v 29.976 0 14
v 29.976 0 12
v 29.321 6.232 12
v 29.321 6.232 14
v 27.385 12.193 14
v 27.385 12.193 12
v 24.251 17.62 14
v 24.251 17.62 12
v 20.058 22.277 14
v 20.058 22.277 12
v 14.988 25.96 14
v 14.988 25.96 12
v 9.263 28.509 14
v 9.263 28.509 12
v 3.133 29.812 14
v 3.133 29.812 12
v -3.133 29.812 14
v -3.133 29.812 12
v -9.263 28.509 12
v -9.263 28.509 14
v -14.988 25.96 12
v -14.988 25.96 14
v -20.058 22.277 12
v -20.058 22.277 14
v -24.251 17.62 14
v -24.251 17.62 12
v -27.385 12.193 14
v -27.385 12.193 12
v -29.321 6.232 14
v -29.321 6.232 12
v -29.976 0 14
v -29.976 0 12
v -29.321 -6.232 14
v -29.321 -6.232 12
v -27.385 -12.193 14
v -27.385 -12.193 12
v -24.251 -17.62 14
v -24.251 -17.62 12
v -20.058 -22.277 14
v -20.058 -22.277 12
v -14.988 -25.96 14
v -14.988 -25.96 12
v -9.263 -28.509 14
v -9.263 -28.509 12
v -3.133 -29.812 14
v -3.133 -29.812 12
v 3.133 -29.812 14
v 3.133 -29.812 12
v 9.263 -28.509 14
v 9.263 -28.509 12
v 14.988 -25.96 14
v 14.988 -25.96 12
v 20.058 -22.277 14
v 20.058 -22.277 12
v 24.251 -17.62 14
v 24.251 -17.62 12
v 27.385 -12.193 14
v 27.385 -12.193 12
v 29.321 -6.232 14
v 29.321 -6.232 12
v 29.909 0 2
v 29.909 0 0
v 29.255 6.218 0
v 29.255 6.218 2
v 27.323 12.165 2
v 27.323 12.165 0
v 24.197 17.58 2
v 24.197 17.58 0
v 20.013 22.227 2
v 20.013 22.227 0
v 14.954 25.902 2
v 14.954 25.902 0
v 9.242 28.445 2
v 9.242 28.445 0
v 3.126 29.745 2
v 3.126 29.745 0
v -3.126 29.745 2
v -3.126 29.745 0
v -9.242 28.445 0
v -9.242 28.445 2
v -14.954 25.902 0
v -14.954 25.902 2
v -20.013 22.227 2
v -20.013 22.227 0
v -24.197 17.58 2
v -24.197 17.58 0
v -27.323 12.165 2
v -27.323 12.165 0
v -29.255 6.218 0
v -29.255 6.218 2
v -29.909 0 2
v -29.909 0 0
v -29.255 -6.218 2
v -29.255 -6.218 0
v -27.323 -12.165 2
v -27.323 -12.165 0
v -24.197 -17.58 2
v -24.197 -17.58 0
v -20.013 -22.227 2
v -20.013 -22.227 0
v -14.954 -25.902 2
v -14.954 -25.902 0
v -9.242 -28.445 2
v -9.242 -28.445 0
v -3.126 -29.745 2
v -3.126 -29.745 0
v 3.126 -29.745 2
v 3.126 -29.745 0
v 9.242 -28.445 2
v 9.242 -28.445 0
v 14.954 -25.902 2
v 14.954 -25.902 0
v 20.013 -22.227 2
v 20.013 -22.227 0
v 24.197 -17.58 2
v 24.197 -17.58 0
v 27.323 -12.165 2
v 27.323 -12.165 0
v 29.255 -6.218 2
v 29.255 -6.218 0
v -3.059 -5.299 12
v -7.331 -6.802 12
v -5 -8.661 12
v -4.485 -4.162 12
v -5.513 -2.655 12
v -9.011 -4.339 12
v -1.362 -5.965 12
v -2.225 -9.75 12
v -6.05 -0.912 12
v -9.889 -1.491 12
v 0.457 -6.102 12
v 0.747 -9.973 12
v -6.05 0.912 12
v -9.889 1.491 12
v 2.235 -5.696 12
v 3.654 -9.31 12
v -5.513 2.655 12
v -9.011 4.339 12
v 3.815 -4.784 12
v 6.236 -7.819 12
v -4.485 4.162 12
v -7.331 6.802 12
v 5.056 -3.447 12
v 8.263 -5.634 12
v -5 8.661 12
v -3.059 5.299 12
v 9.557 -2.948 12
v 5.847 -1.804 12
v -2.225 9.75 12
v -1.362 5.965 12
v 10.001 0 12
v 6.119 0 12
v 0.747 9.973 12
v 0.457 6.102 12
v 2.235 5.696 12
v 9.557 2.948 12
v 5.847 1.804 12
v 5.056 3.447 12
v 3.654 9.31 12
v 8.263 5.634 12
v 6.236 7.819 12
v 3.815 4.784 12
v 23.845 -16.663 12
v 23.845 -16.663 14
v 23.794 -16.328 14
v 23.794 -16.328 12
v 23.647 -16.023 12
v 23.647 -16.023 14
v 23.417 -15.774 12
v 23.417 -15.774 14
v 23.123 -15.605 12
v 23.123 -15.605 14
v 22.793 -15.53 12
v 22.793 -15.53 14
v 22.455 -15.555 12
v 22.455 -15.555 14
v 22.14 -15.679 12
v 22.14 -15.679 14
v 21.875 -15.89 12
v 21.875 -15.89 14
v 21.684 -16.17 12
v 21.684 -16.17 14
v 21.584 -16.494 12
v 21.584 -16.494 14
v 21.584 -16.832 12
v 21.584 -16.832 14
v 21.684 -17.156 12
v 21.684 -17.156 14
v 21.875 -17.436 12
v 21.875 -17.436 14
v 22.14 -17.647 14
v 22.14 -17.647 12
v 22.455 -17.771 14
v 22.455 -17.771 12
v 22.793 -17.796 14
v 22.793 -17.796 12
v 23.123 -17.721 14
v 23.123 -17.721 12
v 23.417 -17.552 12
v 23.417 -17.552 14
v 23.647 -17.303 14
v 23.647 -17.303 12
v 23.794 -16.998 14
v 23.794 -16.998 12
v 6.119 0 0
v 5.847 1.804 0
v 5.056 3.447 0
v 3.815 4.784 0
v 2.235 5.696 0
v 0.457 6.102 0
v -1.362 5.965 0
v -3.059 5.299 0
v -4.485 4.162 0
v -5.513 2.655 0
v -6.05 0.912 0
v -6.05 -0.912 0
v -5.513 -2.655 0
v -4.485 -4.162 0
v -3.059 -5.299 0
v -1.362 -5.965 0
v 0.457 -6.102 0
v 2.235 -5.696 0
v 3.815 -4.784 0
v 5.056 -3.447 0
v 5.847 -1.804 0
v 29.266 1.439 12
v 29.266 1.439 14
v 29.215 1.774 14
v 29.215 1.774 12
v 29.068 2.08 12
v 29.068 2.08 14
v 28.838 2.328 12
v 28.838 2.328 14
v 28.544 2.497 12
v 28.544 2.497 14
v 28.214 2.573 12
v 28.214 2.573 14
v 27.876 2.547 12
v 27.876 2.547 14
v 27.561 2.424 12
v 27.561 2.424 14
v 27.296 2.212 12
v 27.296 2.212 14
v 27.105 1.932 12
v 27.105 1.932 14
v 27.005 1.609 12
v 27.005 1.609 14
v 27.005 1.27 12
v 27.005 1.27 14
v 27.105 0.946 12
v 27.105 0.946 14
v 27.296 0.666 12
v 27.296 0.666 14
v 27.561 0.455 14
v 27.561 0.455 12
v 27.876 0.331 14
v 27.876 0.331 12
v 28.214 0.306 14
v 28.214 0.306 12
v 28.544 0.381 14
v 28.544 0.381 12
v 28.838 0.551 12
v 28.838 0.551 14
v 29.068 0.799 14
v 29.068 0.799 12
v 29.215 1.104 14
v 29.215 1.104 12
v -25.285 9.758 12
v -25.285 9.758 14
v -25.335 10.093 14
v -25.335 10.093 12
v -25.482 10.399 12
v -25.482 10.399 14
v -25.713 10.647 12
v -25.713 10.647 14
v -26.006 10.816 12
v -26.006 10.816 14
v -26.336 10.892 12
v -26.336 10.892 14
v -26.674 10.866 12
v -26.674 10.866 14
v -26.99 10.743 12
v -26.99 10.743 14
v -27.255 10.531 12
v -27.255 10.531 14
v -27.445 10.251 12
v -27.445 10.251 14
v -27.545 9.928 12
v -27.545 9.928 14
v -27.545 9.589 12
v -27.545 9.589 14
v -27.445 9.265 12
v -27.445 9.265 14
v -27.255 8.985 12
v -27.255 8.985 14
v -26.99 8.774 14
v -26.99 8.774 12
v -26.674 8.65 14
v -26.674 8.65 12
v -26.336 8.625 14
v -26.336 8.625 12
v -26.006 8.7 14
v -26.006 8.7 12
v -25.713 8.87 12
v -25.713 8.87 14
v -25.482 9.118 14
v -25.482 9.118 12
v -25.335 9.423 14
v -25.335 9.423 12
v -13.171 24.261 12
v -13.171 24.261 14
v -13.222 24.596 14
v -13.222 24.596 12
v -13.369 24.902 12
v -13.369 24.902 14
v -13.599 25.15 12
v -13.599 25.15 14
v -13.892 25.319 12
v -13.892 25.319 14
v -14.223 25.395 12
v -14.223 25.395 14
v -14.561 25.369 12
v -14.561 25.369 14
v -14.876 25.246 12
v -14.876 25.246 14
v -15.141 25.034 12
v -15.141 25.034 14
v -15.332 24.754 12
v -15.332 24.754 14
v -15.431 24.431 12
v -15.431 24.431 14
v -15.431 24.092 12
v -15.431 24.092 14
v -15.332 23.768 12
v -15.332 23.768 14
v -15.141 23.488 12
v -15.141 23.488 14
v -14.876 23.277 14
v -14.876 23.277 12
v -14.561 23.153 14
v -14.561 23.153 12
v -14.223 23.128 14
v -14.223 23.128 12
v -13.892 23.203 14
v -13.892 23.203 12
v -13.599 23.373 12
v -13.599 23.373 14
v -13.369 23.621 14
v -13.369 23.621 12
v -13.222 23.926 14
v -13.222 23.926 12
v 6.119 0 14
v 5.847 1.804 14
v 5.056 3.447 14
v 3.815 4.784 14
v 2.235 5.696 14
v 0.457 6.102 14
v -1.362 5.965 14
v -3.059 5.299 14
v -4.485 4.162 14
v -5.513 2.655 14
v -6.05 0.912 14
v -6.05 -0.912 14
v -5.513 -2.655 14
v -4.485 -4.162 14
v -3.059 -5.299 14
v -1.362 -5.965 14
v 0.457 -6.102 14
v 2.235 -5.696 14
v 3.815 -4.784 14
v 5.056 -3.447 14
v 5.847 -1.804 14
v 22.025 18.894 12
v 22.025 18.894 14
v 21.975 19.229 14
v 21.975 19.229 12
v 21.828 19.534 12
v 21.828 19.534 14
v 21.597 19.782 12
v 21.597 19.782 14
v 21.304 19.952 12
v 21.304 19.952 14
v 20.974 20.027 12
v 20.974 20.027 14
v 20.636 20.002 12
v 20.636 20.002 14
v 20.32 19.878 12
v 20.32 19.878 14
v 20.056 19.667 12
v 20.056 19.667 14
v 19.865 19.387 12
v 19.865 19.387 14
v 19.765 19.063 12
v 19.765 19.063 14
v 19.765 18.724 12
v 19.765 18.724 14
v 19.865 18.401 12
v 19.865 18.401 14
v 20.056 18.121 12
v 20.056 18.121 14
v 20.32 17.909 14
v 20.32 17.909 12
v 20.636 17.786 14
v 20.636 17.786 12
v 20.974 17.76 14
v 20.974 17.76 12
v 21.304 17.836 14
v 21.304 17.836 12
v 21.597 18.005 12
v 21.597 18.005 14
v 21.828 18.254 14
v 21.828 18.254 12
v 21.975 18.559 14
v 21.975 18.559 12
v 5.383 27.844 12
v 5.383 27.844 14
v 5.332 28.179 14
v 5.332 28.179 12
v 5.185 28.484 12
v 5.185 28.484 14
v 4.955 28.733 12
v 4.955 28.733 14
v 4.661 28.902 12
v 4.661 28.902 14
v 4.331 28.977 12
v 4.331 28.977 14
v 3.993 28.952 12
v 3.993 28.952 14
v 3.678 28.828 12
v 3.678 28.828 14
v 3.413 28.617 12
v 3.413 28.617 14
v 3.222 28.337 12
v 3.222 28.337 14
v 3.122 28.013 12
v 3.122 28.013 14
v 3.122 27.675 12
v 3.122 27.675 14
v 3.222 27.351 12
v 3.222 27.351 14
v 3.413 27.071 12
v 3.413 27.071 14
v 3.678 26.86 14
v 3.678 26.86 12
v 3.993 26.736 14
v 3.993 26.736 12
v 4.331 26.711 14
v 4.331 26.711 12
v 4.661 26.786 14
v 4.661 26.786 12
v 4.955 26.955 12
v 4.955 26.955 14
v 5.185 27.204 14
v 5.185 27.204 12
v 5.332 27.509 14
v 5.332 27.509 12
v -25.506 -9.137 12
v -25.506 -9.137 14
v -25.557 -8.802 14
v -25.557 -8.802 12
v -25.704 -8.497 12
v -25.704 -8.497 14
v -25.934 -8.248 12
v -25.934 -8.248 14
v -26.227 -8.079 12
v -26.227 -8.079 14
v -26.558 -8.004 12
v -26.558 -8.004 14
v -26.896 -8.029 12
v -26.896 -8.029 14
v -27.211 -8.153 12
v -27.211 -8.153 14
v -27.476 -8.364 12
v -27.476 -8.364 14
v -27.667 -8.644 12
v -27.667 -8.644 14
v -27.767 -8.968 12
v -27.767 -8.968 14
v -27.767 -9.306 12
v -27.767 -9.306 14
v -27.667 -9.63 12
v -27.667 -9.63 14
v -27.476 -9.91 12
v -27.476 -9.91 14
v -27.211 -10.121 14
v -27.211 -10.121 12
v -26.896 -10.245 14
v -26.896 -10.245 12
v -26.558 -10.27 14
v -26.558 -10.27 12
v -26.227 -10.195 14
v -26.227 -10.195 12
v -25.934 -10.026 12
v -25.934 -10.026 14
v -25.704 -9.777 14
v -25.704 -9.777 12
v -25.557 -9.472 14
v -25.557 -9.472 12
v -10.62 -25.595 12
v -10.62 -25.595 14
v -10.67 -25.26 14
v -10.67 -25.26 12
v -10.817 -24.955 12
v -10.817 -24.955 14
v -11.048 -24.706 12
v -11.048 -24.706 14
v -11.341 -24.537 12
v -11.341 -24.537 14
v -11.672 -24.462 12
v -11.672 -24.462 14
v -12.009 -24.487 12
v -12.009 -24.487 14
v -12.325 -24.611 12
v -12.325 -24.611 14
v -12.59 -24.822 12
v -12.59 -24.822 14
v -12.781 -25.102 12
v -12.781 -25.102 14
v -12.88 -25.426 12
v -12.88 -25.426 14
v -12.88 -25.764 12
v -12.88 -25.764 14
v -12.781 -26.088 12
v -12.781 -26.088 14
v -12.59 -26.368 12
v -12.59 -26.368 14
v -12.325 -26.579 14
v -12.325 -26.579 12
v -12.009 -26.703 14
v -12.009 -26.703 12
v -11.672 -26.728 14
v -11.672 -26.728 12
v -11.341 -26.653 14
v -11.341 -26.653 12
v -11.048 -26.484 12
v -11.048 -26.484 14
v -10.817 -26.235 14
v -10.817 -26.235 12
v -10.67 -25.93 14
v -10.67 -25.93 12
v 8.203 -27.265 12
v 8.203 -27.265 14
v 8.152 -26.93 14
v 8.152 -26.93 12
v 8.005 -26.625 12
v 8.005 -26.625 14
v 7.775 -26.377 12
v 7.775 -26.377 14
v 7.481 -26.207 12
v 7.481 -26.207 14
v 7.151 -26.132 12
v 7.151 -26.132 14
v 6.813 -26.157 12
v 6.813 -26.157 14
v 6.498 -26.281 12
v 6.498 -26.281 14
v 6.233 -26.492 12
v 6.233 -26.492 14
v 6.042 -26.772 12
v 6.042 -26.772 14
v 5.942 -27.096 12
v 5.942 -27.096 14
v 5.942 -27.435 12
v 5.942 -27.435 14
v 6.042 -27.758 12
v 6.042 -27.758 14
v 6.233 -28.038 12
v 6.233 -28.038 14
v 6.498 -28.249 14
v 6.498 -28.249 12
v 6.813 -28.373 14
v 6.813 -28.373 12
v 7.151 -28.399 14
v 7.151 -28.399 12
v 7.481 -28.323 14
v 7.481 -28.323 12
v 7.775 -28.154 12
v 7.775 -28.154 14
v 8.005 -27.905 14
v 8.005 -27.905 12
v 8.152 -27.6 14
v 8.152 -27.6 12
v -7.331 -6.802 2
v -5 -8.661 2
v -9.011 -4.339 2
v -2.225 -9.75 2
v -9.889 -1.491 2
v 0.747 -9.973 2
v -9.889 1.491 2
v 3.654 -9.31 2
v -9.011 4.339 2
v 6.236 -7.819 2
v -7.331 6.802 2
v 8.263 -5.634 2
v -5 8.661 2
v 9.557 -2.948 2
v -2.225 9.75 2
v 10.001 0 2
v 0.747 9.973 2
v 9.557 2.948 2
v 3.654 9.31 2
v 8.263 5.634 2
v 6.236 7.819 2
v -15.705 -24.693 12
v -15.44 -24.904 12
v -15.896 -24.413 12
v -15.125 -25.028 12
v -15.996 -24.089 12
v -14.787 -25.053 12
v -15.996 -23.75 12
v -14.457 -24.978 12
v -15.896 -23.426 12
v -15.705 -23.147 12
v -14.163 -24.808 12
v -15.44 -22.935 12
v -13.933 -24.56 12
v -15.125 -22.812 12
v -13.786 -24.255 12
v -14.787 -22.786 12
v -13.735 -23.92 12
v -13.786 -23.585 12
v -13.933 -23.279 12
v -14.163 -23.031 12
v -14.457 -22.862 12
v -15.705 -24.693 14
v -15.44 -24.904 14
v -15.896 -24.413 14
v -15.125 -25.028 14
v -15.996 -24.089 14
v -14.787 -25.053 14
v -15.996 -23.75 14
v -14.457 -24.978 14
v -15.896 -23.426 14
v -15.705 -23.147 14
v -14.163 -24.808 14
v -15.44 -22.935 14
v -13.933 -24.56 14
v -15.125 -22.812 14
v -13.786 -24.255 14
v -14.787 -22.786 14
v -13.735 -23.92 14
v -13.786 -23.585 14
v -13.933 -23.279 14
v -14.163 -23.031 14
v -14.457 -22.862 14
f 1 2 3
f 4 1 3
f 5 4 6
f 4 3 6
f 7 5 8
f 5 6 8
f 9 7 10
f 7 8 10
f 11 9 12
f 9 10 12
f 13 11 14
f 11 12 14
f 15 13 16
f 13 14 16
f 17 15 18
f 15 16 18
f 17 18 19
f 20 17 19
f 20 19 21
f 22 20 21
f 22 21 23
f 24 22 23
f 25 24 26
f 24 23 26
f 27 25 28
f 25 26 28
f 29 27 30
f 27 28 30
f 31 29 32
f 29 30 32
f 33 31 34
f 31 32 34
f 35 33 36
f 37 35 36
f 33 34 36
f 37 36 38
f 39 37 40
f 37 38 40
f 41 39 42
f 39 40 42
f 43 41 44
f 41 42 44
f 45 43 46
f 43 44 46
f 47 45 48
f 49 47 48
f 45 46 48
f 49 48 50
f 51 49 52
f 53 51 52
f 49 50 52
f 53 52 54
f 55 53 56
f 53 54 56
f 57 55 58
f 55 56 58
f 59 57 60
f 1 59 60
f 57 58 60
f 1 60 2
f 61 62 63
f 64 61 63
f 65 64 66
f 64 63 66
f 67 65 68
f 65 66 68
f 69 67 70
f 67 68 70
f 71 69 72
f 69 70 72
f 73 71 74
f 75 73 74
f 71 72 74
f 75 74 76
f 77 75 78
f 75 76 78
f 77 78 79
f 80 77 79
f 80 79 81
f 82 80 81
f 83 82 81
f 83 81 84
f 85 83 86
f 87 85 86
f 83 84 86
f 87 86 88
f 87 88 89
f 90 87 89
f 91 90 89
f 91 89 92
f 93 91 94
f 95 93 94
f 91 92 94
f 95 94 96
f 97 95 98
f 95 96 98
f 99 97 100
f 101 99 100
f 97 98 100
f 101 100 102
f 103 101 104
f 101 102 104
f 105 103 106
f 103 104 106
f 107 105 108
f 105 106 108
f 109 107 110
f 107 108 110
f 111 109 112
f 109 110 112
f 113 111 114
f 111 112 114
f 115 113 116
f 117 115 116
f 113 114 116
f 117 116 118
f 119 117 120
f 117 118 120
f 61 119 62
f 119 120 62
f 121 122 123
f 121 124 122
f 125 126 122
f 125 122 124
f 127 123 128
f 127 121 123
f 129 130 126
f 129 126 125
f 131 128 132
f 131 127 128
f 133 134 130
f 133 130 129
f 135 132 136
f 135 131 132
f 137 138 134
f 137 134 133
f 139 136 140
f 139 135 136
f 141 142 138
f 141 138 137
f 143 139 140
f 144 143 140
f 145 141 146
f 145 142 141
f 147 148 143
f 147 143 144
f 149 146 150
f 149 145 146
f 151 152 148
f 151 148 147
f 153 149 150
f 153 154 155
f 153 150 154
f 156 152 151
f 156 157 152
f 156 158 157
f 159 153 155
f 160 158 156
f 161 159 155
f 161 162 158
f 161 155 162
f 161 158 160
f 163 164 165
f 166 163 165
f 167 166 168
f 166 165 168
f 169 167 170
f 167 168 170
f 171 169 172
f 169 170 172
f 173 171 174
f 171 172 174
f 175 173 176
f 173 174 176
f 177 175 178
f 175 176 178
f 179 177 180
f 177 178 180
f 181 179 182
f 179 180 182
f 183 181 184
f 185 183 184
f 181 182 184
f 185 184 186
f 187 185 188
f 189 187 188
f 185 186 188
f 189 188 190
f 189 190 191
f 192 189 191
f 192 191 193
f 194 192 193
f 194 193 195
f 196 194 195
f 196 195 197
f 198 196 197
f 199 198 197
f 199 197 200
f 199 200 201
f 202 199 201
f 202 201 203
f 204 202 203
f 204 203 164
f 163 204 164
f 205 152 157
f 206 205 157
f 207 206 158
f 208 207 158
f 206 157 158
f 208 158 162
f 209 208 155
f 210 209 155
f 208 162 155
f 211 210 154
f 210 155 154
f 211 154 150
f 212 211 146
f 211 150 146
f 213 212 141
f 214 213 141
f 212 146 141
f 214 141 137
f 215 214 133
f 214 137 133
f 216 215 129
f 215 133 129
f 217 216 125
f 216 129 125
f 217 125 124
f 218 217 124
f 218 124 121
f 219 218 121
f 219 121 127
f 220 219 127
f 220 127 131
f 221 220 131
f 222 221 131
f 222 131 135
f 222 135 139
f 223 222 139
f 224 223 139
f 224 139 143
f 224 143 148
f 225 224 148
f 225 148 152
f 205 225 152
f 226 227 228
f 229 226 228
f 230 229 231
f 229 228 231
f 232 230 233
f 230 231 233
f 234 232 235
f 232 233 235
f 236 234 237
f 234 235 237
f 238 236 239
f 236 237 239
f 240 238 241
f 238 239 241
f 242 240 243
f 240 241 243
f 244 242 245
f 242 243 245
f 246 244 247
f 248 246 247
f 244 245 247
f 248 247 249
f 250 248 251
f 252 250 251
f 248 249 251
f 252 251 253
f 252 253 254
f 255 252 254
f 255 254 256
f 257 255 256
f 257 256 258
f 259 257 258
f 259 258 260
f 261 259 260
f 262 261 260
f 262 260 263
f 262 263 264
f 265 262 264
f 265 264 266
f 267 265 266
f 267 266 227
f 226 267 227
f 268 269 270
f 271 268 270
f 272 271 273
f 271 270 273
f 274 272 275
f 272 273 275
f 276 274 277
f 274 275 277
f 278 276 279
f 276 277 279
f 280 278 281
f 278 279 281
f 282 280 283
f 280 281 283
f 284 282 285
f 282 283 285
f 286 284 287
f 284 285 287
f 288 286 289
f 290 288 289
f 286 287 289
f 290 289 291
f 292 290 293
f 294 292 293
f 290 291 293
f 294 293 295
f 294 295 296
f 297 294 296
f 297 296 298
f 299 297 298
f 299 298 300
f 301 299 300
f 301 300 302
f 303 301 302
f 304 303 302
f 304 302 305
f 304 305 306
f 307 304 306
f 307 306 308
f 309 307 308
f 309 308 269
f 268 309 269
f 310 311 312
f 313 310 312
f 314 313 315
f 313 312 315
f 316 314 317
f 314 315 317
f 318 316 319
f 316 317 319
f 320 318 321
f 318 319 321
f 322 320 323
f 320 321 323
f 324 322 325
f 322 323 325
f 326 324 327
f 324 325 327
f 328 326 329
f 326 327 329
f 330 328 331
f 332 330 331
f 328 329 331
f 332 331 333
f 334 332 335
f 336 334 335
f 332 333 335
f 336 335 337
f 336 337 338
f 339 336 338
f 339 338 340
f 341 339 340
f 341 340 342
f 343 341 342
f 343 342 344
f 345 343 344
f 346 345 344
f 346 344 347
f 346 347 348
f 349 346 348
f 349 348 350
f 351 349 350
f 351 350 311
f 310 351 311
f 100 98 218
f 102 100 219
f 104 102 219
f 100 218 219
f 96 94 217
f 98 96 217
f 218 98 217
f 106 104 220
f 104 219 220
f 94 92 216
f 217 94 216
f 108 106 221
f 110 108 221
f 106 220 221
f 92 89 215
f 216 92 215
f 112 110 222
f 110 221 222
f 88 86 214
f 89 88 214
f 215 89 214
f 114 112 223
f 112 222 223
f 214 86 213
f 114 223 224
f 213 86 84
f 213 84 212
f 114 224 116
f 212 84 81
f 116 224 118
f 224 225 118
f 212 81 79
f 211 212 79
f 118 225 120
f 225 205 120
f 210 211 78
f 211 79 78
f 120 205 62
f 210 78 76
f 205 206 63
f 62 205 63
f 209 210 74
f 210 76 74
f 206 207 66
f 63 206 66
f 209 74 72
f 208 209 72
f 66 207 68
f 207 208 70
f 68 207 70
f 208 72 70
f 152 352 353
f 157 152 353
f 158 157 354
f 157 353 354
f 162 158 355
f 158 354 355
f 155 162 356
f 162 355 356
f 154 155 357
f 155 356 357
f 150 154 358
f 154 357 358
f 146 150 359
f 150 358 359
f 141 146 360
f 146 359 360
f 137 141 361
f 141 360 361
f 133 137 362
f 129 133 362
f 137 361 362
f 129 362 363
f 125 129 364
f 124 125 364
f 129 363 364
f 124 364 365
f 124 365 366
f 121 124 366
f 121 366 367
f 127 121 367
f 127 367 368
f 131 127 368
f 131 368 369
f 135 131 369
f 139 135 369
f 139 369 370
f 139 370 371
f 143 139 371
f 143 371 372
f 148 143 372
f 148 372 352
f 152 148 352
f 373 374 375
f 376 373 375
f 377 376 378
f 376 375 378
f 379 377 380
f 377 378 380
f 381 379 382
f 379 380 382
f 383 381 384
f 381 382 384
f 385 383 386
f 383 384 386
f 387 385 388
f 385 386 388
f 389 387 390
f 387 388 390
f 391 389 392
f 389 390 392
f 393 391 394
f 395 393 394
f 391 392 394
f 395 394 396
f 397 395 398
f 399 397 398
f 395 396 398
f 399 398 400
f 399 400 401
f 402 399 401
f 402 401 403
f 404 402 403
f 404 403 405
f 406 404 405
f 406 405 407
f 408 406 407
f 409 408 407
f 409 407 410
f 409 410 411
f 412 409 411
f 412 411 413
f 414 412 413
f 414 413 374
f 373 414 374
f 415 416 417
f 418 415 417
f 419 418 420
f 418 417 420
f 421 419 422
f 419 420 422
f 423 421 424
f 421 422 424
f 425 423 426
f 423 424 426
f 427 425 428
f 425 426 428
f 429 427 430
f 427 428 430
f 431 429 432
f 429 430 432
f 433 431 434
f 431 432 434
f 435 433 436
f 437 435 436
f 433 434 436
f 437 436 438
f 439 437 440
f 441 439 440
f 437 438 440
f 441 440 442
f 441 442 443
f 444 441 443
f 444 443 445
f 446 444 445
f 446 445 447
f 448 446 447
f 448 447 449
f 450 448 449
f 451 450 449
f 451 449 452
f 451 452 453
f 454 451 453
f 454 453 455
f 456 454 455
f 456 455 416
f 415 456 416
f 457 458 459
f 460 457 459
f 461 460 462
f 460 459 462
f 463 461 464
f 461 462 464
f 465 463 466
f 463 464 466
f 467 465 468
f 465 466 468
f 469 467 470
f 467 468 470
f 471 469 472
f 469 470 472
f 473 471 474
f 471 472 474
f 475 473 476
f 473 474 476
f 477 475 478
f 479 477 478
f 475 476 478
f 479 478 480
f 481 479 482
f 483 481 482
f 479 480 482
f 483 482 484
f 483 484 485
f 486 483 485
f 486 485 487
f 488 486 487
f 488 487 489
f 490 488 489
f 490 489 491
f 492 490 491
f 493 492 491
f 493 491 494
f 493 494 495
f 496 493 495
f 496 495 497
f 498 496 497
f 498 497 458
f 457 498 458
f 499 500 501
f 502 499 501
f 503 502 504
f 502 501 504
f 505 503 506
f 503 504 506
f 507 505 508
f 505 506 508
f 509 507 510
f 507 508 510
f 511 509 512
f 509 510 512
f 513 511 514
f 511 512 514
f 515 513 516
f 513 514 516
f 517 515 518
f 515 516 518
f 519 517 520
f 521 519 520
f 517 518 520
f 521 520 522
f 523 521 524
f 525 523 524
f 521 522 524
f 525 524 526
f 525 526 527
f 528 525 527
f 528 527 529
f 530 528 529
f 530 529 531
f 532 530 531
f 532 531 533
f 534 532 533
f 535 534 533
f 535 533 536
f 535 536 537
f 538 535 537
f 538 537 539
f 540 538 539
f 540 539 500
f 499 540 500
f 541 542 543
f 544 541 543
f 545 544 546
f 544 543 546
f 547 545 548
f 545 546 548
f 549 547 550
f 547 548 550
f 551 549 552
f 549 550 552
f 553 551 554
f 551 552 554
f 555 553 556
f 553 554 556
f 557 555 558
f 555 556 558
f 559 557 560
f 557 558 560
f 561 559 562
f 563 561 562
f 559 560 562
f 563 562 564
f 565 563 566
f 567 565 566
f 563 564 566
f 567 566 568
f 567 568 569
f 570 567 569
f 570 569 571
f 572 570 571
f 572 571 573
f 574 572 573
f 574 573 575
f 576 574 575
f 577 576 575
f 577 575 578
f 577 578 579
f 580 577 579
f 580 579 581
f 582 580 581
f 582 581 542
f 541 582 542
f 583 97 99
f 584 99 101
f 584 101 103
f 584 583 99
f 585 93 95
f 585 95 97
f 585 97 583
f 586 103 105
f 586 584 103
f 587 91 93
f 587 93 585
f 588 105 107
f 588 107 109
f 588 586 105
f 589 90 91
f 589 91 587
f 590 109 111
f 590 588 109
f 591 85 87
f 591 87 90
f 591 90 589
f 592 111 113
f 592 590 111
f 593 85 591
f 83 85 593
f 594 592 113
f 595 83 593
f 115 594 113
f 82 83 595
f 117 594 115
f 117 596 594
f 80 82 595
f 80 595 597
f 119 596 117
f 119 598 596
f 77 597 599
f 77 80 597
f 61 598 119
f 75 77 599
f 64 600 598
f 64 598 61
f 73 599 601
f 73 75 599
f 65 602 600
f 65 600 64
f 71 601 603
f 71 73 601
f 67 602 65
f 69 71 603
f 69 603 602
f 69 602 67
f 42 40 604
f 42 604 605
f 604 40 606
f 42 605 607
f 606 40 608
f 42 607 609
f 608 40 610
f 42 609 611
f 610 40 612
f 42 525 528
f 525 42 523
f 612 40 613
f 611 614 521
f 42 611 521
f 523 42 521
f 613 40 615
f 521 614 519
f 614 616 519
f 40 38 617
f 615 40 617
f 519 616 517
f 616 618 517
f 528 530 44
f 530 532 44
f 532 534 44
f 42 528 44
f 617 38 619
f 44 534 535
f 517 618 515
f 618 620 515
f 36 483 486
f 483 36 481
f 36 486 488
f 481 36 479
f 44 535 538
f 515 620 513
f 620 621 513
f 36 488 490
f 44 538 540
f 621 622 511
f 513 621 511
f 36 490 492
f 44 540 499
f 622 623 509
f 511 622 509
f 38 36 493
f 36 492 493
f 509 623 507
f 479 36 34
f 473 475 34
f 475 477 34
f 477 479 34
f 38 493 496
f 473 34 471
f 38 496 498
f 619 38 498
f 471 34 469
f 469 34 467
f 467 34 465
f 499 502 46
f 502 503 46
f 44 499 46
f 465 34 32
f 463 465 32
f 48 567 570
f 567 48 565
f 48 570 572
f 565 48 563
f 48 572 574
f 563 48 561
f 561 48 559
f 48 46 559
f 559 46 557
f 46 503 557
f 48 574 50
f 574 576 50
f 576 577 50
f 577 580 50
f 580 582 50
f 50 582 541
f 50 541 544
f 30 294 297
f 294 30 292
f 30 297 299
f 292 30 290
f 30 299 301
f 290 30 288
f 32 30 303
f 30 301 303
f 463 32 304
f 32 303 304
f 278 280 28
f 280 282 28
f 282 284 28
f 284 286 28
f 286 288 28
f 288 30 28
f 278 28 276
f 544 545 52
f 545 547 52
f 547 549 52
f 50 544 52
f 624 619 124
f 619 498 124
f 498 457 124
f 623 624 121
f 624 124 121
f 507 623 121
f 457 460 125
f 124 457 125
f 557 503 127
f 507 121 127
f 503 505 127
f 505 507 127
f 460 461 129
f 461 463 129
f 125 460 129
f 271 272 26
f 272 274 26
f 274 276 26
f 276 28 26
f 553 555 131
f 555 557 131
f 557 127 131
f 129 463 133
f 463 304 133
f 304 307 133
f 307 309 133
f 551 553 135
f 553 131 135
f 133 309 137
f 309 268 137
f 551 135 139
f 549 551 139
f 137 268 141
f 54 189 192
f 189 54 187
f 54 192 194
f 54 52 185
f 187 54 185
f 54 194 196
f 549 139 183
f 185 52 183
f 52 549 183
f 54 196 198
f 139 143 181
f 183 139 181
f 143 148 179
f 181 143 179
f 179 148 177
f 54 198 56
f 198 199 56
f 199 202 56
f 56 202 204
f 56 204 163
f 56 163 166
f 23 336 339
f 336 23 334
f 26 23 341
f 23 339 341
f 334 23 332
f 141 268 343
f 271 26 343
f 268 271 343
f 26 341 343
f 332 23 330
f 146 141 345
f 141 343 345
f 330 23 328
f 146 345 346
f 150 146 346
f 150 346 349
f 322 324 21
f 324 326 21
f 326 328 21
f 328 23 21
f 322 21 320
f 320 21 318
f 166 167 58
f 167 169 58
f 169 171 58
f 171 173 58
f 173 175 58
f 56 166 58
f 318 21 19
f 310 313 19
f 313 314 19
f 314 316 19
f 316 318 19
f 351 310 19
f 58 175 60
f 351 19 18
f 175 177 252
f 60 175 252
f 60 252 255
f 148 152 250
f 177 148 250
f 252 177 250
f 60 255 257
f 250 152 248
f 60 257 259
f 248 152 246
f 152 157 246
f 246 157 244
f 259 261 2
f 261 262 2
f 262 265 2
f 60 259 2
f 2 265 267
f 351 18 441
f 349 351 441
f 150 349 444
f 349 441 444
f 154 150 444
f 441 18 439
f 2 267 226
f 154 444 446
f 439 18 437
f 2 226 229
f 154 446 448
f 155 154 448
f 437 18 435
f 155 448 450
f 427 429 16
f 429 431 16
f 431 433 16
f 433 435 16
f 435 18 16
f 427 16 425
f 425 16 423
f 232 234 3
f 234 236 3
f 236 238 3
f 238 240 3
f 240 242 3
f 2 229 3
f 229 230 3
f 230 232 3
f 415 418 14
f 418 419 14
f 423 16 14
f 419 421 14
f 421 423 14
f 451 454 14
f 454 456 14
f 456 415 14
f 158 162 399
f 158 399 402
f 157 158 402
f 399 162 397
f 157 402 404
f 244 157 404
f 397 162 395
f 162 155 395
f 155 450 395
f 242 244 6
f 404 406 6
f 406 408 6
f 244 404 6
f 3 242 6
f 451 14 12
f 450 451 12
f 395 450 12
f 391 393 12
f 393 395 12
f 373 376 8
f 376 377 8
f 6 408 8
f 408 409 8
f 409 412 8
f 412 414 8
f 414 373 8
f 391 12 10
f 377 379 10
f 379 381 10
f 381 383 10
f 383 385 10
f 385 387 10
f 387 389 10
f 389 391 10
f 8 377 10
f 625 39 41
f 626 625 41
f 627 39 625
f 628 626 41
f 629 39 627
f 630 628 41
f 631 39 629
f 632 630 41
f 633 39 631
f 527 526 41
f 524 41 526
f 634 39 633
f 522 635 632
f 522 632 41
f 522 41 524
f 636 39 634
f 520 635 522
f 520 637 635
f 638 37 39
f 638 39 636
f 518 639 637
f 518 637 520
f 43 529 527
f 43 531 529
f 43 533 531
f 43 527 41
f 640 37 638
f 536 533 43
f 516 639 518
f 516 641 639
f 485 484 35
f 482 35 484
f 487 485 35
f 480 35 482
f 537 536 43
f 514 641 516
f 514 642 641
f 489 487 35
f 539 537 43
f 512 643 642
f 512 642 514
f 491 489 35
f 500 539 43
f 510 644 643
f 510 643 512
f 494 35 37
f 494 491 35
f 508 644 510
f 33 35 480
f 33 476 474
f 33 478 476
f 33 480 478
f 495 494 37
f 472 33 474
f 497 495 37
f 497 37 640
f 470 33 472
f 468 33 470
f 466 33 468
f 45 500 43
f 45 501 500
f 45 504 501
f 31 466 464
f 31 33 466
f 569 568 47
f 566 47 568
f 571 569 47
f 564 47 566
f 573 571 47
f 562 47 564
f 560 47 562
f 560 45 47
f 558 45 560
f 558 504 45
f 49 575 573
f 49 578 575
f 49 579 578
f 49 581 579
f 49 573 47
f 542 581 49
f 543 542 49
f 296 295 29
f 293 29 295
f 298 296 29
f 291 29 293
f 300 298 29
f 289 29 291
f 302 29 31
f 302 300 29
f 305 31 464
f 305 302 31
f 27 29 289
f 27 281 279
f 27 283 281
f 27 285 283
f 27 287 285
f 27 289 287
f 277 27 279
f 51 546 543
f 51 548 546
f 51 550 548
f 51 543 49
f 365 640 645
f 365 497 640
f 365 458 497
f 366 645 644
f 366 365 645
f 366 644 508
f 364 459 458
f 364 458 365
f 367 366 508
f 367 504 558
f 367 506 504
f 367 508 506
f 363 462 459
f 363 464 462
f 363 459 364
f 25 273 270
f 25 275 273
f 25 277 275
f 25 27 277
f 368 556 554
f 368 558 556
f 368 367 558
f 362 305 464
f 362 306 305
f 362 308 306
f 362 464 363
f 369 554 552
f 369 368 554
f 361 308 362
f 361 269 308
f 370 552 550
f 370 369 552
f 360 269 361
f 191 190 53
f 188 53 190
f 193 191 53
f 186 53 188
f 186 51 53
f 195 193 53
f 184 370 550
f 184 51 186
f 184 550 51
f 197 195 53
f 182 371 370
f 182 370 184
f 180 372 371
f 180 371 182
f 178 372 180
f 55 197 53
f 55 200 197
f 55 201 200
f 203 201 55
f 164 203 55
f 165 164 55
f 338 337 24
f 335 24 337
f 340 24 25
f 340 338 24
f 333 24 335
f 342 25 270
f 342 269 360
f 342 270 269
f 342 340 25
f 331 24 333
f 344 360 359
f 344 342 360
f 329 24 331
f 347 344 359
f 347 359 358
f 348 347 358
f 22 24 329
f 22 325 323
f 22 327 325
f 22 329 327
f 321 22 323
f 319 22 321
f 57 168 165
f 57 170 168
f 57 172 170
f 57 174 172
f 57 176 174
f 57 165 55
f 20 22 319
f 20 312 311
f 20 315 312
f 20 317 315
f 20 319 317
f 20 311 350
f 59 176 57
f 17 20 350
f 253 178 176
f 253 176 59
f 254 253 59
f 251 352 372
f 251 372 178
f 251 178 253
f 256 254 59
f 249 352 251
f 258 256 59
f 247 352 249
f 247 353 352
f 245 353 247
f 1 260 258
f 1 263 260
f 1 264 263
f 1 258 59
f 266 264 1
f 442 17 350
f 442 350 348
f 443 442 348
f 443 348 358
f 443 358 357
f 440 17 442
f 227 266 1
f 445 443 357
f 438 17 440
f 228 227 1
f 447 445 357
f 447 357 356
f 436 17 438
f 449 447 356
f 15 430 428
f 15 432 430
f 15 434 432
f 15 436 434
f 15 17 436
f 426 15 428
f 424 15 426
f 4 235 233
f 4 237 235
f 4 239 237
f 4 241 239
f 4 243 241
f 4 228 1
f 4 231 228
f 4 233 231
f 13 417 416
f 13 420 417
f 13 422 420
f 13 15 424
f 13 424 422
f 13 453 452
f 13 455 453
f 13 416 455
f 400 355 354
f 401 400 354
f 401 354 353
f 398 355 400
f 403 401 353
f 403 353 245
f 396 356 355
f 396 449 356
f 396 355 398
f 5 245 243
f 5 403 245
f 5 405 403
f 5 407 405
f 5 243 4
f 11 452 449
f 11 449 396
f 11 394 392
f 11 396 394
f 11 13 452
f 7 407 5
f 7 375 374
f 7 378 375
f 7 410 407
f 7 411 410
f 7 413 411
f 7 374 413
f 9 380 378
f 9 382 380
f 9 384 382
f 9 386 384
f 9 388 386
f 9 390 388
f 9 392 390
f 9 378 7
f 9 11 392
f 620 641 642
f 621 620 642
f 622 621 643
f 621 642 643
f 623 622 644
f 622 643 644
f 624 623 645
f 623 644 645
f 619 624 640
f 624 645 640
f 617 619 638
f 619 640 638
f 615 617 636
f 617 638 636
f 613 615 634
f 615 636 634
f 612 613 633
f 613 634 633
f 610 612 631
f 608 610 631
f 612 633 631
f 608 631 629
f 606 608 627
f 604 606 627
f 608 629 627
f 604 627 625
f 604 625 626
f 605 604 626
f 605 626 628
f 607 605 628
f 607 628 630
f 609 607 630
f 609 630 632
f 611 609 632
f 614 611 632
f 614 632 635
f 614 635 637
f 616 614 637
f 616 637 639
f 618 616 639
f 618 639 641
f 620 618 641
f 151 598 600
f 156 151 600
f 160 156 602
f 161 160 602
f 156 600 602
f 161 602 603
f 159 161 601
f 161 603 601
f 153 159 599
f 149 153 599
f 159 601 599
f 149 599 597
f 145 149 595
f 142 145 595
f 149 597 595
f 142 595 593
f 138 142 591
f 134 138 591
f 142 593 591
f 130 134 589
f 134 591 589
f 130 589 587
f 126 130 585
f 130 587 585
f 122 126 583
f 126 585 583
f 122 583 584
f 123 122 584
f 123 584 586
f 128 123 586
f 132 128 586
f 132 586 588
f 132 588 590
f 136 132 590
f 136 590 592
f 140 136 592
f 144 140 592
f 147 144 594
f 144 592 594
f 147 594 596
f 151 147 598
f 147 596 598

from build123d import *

# Parameters (mm, degrees)
F0_R     = 29.9089661925
F1_DEPTH = 2
F2_R     = 10.0009924636
F3_DEPTH = 10
F4_R     = 29.9764800093
F5_DEPTH = 2
F6_R     = 1.1365848363
F7_DEPTH = 25
F8_R     = 6.1187155748
F9_DEPTH = 25


with BuildPart() as f1:
    # F0 (on Top) → F1 (new body)
    with BuildSketch(Plane.XY):
        Circle(F0_R)
    extrude(amount=F1_DEPTH)

    # F2 (on face) → F3 (join)
    with BuildSketch(Plane.XY.offset(2)):
        Circle(F2_R)
    extrude(amount=F3_DEPTH)


with BuildPart() as f5:
    # F4 (on face) → F5 (new body)
    with BuildSketch(Plane.XY.offset(12)):
        Circle(F4_R)
    extrude(amount=F5_DEPTH)

    # F6 (on face) → F7 (cut)
    with BuildSketch(Plane.XY.offset(14)):
        with Locations((-14.8717621341, -23.9195972681)):
            Circle(F6_R)
        with Locations((-26.6426764835, -9.136970627)):
            Circle(F6_R)
        with Locations((-26.4214284802, 9.7583072051)):
            Circle(F6_R)
        with Locations((-14.3076042892, 24.2612634038)):
            Circle(F6_R)
        with Locations((4.2462302972, 27.8439575259)):
            Circle(F6_R)
        with Locations((20.888789823, 18.8937794571)):
            Circle(F6_R)
        with Locations((28.1290748038, 1.439302999)):
            Circle(F6_R)
        with Locations((22.7081531643, -16.6630196036)):
            Circle(F6_R)
        with Locations((7.0660414861, -27.2651334154)):
            Circle(F6_R)
        with Locations((-11.75657335, -25.5949101485)):
            Circle(F6_R)
    extrude(amount=-F7_DEPTH, mode=Mode.SUBTRACT)


with BuildPart() as f9_tool:
    # F8 (on face) → F9 (new body)
    with BuildSketch(Plane.XY.offset(14)):
        Circle(F8_R)
    extrude(amount=-F9_DEPTH)


with BuildPart() as f1_1:
    add(f1.part)

    # F9: cut by f9_tool
    add(f9_tool.part, mode=Mode.SUBTRACT)


with BuildPart() as f5_1:
    add(f5.part)

    # F9: cut by f9_tool
    add(f9_tool.part, mode=Mode.SUBTRACT)


solid = Compound([f1_1.part, f5_1.part])
